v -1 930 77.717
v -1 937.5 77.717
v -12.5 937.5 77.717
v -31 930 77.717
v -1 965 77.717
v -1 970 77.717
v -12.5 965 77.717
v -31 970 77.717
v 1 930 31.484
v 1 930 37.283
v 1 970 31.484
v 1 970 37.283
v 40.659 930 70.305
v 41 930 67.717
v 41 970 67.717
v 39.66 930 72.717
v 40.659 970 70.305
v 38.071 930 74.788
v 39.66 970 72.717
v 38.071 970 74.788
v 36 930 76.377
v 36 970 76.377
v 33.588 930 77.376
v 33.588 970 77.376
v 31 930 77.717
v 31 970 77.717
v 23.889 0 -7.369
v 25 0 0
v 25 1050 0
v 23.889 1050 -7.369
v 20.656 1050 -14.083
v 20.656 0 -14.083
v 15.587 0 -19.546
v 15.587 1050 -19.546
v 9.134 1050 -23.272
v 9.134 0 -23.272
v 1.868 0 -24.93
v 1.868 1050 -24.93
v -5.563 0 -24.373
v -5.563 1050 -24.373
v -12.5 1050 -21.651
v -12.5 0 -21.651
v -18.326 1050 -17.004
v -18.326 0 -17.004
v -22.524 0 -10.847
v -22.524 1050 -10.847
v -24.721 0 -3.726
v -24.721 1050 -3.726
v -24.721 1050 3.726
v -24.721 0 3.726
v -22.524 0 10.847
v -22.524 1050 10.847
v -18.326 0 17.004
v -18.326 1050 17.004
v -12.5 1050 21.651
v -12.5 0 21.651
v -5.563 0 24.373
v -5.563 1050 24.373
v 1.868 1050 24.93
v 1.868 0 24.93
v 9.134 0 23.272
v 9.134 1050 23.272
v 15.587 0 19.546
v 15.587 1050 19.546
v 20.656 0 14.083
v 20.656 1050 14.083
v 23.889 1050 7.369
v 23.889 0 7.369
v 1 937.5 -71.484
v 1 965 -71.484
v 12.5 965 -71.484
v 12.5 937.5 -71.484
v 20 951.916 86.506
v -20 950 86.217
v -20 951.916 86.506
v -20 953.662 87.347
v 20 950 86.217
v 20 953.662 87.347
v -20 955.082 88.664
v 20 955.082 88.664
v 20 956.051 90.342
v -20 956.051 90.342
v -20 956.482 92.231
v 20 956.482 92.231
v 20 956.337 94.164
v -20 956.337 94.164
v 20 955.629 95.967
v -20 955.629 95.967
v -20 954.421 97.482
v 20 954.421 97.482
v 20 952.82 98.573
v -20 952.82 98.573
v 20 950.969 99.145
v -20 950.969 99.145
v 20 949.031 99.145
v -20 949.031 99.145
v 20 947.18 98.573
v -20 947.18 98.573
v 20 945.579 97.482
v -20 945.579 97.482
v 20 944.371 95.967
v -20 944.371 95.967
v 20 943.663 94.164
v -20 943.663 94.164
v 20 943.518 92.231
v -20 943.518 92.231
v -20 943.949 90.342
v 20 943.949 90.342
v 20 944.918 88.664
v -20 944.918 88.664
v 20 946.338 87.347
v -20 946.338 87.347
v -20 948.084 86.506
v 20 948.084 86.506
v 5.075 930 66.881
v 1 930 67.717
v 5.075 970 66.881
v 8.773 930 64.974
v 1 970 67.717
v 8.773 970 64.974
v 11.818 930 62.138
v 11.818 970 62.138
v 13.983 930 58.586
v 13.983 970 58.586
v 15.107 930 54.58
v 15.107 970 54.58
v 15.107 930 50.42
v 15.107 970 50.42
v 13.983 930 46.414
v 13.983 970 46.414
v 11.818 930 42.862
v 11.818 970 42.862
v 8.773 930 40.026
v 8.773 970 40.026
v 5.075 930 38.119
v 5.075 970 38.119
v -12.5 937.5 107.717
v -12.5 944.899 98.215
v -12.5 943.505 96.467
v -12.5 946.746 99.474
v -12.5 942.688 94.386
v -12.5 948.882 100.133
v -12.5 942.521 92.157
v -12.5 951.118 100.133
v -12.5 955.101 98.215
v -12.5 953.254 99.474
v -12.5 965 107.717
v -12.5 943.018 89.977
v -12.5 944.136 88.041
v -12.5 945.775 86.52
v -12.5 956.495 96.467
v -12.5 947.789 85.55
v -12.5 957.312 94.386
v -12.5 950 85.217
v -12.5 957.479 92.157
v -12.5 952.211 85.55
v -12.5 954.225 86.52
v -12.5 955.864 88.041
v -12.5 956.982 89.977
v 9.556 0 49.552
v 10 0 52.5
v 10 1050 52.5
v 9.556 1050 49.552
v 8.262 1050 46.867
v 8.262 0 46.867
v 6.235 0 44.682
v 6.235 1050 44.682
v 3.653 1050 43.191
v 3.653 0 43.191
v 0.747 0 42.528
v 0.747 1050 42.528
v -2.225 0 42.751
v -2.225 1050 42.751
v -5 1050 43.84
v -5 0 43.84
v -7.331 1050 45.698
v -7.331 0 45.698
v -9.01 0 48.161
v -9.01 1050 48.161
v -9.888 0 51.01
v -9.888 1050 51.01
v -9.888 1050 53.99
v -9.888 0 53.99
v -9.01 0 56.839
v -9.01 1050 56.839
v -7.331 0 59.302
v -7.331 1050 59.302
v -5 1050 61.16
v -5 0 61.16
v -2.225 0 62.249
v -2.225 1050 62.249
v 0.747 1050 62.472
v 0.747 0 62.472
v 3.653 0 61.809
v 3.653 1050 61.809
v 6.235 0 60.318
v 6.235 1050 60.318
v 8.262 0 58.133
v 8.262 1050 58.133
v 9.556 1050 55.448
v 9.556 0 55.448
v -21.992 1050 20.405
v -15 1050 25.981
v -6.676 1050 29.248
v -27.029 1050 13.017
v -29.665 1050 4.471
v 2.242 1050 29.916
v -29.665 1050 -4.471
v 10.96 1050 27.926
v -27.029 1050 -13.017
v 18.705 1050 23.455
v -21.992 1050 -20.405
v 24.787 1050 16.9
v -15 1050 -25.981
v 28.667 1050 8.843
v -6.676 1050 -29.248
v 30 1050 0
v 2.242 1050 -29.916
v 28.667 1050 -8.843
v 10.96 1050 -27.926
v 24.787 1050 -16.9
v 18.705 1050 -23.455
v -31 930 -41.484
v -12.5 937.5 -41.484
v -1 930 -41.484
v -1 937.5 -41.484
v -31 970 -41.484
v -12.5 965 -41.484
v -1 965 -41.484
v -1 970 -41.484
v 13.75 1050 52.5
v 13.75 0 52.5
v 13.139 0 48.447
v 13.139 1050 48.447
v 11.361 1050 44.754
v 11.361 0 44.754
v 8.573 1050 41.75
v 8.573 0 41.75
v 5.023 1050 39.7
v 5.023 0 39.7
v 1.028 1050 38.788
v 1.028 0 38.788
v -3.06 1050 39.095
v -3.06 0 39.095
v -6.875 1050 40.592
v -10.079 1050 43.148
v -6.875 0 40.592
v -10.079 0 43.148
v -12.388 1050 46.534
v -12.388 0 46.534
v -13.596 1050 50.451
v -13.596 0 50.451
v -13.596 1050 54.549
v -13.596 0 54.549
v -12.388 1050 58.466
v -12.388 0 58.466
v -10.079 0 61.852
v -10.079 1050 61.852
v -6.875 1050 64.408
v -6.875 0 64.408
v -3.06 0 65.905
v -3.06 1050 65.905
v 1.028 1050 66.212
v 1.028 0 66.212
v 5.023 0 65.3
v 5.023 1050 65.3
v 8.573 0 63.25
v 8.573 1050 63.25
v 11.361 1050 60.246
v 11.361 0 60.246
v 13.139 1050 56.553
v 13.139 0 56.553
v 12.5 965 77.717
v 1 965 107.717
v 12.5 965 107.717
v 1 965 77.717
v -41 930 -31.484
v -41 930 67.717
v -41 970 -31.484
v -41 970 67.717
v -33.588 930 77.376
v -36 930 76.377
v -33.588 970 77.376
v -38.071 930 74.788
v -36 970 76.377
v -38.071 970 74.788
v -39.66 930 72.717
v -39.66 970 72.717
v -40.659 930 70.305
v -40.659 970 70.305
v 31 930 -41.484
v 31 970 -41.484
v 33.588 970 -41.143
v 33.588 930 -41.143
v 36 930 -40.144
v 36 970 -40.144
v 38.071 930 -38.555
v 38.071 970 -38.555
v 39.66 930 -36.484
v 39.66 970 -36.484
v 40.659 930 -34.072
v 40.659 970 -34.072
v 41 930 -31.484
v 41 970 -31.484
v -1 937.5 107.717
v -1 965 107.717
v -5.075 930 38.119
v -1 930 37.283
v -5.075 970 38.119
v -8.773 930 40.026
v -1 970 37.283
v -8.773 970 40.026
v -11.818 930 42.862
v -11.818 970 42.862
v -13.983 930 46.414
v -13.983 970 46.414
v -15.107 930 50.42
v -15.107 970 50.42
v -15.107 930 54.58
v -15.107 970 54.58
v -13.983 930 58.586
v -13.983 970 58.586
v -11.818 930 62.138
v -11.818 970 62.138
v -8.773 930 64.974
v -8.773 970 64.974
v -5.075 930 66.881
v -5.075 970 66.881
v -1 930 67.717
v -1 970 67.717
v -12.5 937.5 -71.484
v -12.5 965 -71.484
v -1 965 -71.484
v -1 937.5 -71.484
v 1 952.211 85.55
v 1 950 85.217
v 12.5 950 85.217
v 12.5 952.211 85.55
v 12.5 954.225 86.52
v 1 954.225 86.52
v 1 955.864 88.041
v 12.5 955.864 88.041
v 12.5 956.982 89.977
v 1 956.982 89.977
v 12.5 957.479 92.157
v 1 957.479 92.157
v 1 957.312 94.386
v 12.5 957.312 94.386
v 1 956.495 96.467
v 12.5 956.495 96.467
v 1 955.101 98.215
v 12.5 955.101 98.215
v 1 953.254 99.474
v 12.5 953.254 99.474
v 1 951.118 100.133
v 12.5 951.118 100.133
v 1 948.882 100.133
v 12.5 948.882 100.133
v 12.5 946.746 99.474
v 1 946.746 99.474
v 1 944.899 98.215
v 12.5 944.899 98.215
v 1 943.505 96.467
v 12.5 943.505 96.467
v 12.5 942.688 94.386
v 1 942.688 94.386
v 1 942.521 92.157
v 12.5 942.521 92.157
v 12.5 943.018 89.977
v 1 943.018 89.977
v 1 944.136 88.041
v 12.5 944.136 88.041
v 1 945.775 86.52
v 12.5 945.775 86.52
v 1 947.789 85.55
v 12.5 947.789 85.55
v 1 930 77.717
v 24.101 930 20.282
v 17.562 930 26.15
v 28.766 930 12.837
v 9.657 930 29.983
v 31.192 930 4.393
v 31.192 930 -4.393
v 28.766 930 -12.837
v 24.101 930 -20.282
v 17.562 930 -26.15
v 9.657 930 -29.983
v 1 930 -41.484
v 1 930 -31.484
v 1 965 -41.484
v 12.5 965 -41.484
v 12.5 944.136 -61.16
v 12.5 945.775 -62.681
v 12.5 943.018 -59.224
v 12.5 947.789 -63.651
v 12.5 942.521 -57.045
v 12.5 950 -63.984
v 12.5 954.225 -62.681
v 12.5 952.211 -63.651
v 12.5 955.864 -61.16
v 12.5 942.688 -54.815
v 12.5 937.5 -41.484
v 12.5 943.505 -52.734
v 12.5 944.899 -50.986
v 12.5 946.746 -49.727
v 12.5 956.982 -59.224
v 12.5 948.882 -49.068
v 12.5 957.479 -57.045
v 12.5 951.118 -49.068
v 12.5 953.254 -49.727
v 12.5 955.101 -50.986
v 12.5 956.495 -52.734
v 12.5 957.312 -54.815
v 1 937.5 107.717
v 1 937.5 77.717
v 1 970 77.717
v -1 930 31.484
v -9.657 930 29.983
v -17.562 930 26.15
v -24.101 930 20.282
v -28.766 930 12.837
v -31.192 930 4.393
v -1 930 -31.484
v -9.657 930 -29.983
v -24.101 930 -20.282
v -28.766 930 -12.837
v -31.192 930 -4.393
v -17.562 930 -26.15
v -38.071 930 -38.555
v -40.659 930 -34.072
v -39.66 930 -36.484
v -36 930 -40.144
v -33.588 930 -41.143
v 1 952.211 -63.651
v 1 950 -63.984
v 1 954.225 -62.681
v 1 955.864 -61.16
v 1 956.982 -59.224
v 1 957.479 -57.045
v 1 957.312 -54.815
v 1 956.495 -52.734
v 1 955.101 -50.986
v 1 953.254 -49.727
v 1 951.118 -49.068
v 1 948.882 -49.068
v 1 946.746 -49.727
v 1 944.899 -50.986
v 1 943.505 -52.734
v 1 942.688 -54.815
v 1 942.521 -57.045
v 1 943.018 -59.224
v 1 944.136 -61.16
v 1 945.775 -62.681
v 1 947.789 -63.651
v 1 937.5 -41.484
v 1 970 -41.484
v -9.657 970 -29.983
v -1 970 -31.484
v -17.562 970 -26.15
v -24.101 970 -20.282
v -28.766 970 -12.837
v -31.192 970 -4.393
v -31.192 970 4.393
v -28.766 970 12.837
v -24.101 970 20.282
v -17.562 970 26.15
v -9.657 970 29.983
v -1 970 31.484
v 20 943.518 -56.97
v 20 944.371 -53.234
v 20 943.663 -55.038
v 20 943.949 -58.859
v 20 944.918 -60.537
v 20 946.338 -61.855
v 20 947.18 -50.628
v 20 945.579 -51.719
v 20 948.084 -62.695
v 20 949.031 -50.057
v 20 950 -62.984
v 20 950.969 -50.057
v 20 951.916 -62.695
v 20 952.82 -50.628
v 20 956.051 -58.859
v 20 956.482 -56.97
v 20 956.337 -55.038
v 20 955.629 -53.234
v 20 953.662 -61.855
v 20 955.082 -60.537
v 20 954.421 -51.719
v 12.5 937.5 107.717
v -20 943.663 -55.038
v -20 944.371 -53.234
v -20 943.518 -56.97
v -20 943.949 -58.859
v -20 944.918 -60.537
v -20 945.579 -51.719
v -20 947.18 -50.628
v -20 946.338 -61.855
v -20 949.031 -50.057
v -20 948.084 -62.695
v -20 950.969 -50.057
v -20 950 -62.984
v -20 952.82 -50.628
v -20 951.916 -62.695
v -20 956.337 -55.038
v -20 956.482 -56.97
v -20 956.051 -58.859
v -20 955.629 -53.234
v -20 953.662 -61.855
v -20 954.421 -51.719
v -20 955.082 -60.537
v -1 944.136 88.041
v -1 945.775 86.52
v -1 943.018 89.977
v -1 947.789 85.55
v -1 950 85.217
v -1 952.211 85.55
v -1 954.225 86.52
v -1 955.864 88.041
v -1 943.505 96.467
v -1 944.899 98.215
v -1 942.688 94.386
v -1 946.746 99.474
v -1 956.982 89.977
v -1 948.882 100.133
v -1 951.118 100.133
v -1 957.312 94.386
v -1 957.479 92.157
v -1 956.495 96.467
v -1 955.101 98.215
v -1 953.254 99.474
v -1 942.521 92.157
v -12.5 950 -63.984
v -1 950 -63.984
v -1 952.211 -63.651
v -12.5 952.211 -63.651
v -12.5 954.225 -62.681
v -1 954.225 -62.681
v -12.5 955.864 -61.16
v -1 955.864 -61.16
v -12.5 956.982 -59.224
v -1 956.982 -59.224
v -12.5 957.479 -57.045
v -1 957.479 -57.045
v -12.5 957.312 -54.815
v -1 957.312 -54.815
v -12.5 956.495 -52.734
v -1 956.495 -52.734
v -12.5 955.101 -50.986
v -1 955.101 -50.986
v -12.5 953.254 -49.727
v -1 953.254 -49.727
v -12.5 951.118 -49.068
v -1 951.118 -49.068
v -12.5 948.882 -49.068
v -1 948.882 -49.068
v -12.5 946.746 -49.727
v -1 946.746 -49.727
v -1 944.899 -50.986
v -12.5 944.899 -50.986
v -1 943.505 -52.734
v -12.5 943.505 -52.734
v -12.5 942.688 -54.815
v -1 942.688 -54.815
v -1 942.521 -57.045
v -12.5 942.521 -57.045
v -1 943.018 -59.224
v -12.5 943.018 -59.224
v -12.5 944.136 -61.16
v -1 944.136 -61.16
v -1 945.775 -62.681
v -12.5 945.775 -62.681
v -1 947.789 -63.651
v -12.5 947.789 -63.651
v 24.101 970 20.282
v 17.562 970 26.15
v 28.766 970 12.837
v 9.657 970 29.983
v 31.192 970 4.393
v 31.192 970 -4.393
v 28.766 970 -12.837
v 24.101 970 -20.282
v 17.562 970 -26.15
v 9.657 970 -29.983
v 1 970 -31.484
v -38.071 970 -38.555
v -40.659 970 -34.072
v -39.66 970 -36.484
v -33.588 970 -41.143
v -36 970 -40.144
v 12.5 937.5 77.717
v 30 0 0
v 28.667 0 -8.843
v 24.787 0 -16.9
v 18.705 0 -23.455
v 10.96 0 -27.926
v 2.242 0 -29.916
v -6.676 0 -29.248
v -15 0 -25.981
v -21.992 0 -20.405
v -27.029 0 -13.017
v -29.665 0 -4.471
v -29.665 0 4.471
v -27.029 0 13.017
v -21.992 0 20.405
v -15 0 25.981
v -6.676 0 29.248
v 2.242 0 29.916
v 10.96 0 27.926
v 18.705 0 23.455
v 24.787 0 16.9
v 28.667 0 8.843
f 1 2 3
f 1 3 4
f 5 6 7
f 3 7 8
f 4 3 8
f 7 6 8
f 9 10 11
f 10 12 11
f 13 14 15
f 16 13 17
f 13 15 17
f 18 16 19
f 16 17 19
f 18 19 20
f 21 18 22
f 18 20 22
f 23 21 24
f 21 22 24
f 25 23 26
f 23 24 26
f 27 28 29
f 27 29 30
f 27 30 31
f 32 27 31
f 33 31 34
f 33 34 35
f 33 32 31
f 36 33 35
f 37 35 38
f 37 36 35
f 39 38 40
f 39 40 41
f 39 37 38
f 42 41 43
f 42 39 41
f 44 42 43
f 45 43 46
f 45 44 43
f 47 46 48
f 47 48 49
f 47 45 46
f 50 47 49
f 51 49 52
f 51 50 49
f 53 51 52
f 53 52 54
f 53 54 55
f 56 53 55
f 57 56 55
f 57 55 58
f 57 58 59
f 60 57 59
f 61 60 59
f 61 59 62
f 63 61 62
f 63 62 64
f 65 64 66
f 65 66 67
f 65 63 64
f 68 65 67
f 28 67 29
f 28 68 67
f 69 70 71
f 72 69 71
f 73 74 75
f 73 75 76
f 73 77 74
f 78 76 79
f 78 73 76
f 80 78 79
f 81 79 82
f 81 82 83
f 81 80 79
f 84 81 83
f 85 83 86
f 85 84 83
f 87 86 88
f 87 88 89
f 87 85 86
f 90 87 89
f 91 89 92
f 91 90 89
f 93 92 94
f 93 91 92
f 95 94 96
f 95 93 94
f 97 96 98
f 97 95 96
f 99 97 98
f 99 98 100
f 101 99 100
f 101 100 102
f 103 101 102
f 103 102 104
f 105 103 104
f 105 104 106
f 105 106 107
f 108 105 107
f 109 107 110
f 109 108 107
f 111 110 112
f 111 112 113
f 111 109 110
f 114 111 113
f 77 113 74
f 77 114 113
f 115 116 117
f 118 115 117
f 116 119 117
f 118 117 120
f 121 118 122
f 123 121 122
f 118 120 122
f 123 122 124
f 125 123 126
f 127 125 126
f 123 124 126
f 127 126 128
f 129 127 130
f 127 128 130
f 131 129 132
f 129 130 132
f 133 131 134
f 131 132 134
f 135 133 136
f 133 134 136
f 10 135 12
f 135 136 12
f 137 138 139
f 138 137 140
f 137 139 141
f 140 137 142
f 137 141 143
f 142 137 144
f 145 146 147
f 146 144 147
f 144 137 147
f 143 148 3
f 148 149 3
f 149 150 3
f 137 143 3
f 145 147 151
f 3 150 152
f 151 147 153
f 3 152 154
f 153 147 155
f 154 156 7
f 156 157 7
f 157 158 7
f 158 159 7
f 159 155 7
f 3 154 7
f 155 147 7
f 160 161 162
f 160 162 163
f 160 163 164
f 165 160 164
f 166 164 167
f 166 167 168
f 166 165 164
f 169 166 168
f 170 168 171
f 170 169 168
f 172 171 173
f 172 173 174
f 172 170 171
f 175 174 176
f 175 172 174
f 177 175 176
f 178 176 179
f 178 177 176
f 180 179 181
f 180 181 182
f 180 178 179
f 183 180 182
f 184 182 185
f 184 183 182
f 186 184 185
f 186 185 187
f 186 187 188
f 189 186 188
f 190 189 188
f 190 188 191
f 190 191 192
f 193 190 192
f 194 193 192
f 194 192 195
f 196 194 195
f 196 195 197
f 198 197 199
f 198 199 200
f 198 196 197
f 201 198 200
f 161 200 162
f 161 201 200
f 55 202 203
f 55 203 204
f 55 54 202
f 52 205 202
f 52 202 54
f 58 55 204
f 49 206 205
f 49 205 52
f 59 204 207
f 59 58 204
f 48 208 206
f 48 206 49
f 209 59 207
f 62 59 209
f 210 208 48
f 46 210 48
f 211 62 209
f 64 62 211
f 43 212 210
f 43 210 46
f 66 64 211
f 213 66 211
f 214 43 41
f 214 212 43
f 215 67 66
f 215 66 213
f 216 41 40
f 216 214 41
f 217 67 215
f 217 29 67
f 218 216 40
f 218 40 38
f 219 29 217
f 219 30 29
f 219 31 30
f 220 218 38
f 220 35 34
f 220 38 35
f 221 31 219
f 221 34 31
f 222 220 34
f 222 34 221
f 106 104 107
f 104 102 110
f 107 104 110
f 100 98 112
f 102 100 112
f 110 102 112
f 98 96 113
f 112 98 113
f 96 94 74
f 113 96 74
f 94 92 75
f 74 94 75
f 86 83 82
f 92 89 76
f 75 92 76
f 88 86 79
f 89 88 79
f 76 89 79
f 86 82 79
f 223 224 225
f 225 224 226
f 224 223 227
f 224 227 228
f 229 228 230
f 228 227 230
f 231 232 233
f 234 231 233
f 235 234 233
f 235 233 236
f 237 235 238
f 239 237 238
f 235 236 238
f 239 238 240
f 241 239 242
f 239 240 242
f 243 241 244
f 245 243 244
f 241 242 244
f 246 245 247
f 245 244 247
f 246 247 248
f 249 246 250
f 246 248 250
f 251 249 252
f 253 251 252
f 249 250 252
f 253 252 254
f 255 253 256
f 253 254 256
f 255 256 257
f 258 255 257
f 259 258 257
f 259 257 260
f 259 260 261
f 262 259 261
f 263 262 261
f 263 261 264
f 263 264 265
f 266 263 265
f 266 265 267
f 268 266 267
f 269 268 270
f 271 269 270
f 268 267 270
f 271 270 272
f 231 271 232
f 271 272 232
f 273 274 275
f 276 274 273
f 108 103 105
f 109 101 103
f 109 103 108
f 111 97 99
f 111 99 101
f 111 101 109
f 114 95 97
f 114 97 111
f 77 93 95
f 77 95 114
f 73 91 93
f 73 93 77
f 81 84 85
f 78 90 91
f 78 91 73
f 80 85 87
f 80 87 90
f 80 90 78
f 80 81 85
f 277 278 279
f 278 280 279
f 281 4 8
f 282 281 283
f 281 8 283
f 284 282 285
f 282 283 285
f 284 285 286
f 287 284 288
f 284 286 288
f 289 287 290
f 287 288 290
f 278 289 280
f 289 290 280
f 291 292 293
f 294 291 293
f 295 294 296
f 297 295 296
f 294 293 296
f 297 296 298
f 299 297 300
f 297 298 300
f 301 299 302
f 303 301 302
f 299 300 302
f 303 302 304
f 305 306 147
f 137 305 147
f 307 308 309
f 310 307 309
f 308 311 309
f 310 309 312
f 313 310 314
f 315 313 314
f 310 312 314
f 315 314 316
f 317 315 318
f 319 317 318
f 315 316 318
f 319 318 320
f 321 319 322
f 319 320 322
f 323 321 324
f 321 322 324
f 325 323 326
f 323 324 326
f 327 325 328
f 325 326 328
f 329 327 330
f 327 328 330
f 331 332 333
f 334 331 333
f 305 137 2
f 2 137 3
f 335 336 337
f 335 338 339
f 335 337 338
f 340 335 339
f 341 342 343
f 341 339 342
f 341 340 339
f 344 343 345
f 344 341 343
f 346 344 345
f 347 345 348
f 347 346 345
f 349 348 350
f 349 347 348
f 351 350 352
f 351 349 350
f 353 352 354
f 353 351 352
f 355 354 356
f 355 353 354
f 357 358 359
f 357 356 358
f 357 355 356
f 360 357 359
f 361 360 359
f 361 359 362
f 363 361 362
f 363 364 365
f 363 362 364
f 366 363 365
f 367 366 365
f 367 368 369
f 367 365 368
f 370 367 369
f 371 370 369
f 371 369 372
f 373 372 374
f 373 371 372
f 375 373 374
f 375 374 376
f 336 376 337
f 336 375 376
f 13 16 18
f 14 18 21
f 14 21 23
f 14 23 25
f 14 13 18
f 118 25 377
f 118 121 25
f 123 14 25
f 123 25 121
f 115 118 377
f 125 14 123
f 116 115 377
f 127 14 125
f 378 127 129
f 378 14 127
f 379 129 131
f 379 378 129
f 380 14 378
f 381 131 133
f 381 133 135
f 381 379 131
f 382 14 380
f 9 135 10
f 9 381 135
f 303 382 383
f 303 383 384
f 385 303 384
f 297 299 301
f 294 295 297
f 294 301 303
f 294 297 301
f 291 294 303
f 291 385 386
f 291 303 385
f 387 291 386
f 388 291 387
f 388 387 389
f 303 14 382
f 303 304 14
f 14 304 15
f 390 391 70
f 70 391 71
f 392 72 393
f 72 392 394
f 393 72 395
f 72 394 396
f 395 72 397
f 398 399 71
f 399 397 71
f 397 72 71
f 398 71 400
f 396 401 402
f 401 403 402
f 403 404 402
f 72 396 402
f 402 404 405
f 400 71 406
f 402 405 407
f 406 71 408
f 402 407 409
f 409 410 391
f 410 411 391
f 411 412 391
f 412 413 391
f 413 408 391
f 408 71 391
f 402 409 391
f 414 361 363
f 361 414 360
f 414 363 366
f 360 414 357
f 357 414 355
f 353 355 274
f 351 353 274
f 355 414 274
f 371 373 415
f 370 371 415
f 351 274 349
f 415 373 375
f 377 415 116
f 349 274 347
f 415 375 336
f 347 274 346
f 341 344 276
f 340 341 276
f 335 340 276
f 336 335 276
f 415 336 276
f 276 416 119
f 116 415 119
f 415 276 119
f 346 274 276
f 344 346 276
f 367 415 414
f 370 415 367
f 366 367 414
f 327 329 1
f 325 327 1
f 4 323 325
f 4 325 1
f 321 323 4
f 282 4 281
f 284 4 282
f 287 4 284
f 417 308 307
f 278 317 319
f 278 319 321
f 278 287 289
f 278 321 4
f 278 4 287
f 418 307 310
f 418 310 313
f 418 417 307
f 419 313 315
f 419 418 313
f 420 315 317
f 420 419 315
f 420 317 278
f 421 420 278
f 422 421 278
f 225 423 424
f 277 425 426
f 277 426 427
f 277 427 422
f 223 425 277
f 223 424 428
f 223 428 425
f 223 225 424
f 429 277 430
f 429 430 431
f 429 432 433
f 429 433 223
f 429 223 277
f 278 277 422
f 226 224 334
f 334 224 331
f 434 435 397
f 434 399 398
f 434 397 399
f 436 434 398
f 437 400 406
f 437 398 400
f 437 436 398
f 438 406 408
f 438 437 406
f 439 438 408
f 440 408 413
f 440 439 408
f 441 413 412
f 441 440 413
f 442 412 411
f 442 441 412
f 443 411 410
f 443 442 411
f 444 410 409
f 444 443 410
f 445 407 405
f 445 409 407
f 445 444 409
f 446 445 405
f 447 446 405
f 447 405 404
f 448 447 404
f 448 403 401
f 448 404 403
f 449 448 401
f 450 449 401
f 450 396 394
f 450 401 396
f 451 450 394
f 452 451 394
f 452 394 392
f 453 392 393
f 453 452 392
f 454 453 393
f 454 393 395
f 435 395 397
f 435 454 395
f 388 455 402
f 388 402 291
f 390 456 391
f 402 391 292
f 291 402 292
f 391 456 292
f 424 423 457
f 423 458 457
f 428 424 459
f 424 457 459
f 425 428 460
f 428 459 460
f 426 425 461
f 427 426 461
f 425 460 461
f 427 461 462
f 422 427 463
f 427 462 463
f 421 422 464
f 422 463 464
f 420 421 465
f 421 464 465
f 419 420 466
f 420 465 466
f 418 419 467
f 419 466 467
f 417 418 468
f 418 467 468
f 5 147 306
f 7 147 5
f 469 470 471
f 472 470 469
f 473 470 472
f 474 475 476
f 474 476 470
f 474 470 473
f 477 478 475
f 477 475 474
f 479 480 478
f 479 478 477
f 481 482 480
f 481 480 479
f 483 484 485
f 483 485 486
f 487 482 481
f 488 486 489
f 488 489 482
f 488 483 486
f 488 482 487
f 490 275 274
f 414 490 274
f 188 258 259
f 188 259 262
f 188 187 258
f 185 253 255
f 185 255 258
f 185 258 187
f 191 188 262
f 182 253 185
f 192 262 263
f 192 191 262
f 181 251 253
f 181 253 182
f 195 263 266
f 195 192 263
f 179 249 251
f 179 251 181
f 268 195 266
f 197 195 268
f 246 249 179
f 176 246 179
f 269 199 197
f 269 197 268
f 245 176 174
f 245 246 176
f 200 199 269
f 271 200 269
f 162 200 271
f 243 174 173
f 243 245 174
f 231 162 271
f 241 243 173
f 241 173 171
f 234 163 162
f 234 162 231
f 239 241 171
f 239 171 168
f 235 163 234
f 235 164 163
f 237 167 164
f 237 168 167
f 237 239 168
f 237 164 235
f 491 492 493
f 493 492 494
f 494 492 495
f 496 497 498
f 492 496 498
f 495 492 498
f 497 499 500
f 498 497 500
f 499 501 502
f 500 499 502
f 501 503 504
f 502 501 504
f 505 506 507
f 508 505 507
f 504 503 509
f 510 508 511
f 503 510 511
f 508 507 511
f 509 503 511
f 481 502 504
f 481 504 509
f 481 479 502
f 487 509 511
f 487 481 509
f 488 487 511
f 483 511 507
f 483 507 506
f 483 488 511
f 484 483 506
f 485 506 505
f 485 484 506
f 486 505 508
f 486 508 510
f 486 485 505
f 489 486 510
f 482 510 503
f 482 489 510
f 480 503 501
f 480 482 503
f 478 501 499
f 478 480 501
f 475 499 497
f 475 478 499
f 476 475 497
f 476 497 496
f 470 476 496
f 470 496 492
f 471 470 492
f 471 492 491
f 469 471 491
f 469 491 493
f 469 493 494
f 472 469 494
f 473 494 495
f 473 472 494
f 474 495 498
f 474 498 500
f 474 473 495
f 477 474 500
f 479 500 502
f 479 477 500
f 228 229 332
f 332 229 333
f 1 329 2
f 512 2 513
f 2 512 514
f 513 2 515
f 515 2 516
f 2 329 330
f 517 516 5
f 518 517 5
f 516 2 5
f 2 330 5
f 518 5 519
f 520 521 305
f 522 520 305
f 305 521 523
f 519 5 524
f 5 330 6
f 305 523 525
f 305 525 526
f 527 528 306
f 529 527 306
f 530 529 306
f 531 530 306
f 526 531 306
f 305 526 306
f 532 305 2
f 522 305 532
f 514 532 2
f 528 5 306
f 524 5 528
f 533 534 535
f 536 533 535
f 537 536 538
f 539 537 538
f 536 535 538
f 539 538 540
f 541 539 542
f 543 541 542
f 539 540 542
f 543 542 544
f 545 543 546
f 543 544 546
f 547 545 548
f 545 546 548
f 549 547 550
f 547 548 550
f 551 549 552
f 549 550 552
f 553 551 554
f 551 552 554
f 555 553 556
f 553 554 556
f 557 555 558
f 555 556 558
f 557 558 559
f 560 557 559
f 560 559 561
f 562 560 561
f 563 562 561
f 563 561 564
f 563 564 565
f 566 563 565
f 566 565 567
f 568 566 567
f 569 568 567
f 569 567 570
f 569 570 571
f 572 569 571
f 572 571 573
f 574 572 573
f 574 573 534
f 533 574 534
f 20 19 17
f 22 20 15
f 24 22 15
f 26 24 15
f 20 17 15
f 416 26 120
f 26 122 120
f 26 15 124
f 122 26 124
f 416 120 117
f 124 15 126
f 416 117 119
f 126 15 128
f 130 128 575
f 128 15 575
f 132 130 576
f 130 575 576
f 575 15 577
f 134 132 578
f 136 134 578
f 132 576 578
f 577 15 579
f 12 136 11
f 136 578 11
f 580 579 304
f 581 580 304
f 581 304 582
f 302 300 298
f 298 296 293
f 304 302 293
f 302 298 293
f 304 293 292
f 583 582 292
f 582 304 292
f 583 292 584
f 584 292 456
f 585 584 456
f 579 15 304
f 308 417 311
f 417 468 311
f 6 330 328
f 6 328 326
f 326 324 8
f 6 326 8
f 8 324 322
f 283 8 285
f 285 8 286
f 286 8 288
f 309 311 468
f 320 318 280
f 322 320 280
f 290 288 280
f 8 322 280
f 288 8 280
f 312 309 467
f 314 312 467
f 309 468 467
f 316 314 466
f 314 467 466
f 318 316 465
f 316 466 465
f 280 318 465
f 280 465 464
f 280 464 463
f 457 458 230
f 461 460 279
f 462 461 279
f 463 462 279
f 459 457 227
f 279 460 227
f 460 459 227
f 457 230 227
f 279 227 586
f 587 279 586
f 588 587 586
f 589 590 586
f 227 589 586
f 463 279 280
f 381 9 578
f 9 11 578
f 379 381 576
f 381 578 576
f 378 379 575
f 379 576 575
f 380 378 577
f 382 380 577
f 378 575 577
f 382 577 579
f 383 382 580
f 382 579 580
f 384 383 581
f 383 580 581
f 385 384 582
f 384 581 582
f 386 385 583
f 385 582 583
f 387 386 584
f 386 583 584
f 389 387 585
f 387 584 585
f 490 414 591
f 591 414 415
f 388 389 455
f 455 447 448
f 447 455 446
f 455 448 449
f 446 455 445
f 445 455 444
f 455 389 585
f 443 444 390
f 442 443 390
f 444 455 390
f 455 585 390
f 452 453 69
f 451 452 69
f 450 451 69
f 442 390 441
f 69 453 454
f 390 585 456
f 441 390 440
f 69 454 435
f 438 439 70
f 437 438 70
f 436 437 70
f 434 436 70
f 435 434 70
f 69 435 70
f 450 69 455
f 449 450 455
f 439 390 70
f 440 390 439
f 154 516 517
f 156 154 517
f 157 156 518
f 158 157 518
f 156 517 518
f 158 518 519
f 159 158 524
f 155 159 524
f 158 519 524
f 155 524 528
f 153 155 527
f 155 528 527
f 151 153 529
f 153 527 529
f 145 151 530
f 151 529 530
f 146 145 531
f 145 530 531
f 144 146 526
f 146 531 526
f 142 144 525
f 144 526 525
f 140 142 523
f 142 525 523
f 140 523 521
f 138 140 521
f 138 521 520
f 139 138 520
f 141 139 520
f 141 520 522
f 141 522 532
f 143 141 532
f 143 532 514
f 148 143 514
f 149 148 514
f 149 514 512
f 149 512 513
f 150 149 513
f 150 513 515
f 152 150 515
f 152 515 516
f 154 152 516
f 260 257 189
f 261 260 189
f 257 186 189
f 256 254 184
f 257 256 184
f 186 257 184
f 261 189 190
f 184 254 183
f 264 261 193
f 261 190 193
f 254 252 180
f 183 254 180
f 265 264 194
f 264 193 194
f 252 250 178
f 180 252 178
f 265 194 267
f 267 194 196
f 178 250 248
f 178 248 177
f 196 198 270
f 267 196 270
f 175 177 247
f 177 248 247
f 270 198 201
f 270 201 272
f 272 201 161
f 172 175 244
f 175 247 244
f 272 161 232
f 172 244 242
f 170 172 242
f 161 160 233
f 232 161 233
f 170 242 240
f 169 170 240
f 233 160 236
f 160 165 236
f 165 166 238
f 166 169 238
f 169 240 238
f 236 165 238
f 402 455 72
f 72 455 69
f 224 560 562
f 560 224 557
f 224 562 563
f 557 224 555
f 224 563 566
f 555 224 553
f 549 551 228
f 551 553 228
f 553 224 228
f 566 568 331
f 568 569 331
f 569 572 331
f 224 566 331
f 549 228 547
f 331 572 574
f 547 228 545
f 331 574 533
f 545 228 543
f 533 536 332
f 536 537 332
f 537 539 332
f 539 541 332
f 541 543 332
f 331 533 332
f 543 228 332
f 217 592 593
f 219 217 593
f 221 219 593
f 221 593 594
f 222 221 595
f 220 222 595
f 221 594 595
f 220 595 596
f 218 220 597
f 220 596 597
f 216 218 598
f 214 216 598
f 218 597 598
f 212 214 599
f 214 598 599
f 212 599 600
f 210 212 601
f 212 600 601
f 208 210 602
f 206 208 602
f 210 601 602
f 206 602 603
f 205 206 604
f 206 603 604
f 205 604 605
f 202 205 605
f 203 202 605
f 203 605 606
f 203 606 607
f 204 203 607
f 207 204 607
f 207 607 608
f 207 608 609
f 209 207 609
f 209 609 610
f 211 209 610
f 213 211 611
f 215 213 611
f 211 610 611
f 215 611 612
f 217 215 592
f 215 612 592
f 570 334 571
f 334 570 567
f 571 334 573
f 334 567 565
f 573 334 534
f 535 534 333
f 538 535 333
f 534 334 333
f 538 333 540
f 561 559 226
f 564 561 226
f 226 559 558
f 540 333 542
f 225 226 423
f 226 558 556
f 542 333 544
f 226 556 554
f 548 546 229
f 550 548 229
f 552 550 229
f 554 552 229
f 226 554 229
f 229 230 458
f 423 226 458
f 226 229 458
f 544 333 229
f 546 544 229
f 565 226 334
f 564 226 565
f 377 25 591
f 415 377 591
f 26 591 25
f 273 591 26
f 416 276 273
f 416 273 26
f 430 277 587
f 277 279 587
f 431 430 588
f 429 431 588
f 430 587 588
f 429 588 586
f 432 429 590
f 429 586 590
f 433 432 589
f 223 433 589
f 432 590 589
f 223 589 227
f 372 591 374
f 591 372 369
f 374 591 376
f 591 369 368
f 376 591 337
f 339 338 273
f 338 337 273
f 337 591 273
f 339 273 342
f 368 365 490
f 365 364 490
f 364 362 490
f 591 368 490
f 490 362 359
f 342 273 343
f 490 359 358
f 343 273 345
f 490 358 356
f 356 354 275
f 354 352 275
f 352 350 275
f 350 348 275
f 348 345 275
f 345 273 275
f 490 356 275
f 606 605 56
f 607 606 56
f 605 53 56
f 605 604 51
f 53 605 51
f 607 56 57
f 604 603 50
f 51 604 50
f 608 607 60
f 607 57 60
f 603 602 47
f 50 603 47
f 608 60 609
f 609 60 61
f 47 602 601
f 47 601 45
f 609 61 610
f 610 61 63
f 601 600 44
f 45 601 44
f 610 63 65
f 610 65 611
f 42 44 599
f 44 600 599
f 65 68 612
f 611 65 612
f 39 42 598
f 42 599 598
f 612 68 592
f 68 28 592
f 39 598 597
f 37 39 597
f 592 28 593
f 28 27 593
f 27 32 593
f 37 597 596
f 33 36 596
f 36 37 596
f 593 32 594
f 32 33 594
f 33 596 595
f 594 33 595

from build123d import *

# Parameters (mm, degrees)
CROQUIS1_R                = 30
CROQUIS1_R_2              = 25
SALIENTE_EXTRUIR1_DEPTH   = 1050
CROQUIS1_R_3              = 13.75
CROQUIS1_R_4              = 10
SALIENTE_EXTRUIR1_2_DEPTH = 1050
SALIENTE_EXTRUIR2_DEPTH   = 20
SALIENTE_EXTRUIR2_2_DEPTH = 20
CROQUIS4_R                = 7.5
CROQUIS4_W                = 30
CROQUIS4_H                = 5
CROQUIS4_H_2              = 7.5
CORTAR_EXTRUIR1_DEPTH     = 20
CROQUIS4_4_R              = 6.5
SALIENTE_EXTRUIR3_DEPTH   = 20
SALIENTE_EXTRUIR3_2_DEPTH = 20


with BuildPart() as part:
    # Croquis1 → Saliente-Extruir1 (new body)
    with BuildSketch(Plane(origin=(0, 0, 0), x_dir=(1, 0, 0), z_dir=(0, 1, 0))):
        Circle(CROQUIS1_R)
        Circle(CROQUIS1_R_2, mode=Mode.SUBTRACT)
    extrude(amount=SALIENTE_EXTRUIR1_DEPTH)


with BuildPart() as body_2:
    # Croquis1 → Saliente-Extruir1 2 (new body)
    with BuildSketch(Plane(origin=(0, 0, 0), x_dir=(1, 0, 0), z_dir=(0, 1, 0))):
        with Locations((0, -52.5)):
            Circle(CROQUIS1_R_3)
        with Locations((0, -52.5)):
            Circle(CROQUIS1_R_4, mode=Mode.SUBTRACT)
    extrude(amount=SALIENTE_EXTRUIR1_2_DEPTH)


with BuildPart() as body_3:
    # Croquis2 → Saliente-Extruir2 (new body, symmetric)
    with BuildSketch(Plane(origin=(0, 950, 0), x_dir=(1, 0, 0), z_dir=(0, 1, 0))):
        with BuildLine():
            Line((-12.5, 71.484122983), (-1, 71.484122983))
            Line((-1, 71.484122983), (-1, 31.484122983))
            ThreePointArc((-1, 31.484122983), (-31.5, 0), (-1, -31.484122983))
            Line((-1, -31.484122983), (-1, -37.282822206))
            ThreePointArc((-1, -37.282822206), (-15.25, -52.5), (-1, -67.717177794))
            Line((-1, -67.717177794), (-1, -107.717177794))
            Line((-1, -107.717177794), (-12.5, -107.717177794))
            Line((-12.5, -107.717177794), (-12.5, -77.717177794))
            Line((-12.5, -77.717177794), (-31, -77.717177794))
            ThreePointArc((-31, -77.717177794), (-38.071067812, -74.788245605), (-41, -67.717177794))
            Line((-41, -67.717177794), (-41, 31.484122983))
            ThreePointArc((-41, 31.484122983), (-38.071067812, 38.555190795), (-31, 41.484122983))
            Line((-31, 41.484122983), (-12.5, 41.484122983))
            Line((-12.5, 41.484122983), (-12.5, 71.484122983))
        make_face()
    extrude(amount=SALIENTE_EXTRUIR2_DEPTH, both=True)


with BuildPart() as body_4:
    # Croquis2 → Saliente-Extruir2 2 (new body, symmetric)
    with BuildSketch(Plane(origin=(0, 950, 0), x_dir=(1, 0, 0), z_dir=(0, 1, 0))):
        with BuildLine():
            Line((41, 31.484122983), (41, -67.717177794))
            ThreePointArc((41, -67.717177794), (38.071067812, -74.788245605), (31, -77.717177794))
            Line((31, -77.717177794), (12.5, -77.717177794))
            Line((12.5, -77.717177794), (12.5, -107.717177794))
            Line((12.5, -107.717177794), (1, -107.717177794))
            Line((1, -107.717177794), (1, -67.717177794))
            ThreePointArc((1, -67.717177794), (15.25, -52.5), (1, -37.282822206))
            Line((1, -37.282822206), (1, -31.484122983))
            ThreePointArc((1, -31.484122983), (31.5, 0), (1, 31.484122983))
            Line((1, 31.484122983), (1, 71.484122983))
            Line((1, 71.484122983), (12.5, 71.484122983))
            Line((12.5, 71.484122983), (12.5, 41.484122983))
            Line((12.5, 41.484122983), (31, 41.484122983))
            ThreePointArc((31, 41.484122983), (38.071067812, 38.555190795), (41, 31.484122983))
        make_face()
    extrude(amount=SALIENTE_EXTRUIR2_2_DEPTH, both=True)


with BuildPart() as cortar_extruir1_tool:
    # Croquis4 → Cortar-Extruir1 (new body, symmetric)
    with BuildSketch(Plane(origin=(0, 0, 0), x_dir=(0, 0, -1), z_dir=(1, 0, 0))):
        with Locations((56.484122983, 950)):
            Circle(CROQUIS4_R)
        with Locations((-92.717177794, 950)):
            Circle(CROQUIS4_R)
        with Locations((-92.717177794, 967.5)):
            Rectangle(CROQUIS4_W, CROQUIS4_H)
        with Locations((-92.717177794, 933.75)):
            Rectangle(CROQUIS4_W, CROQUIS4_H_2)
        with Locations((56.484122983, 933.75)):
            Rectangle(CROQUIS4_W, CROQUIS4_H_2)
        with Locations((56.484122983, 967.5)):
            Rectangle(CROQUIS4_W, CROQUIS4_H)
    extrude(amount=CORTAR_EXTRUIR1_DEPTH, both=True)


with BuildPart() as body_3_1:
    add(body_3.part)

    # Cortar-Extruir1: cut by cortar_extruir1_tool
    add(cortar_extruir1_tool.part, mode=Mode.SUBTRACT)


with BuildPart() as body_4_1:
    add(body_4.part)

    # Cortar-Extruir1: cut by cortar_extruir1_tool
    add(cortar_extruir1_tool.part, mode=Mode.SUBTRACT)


with BuildPart() as body_5:
    # Croquis4<4> → Saliente-Extruir3 (new body, symmetric)
    with BuildSketch(Plane(origin=(0, 0, 0), x_dir=(0, 0, -1), z_dir=(1, 0, 0))):
        with Locations((56.484122983, 950)):
            Circle(CROQUIS4_4_R)
    extrude(amount=SALIENTE_EXTRUIR3_DEPTH, both=True)


with BuildPart() as body_6:
    # Croquis4<4> → Saliente-Extruir3 2 (new body, symmetric)
    with BuildSketch(Plane(origin=(0, 0, 0), x_dir=(0, 0, -1), z_dir=(1, 0, 0))):
        with Locations((-92.717177794, 950)):
            Circle(CROQUIS4_4_R)
    extrude(amount=SALIENTE_EXTRUIR3_2_DEPTH, both=True)


solid = Compound([part.part, body_2.part, body_3_1.part, body_4_1.part, body_5.part, body_6.part])
